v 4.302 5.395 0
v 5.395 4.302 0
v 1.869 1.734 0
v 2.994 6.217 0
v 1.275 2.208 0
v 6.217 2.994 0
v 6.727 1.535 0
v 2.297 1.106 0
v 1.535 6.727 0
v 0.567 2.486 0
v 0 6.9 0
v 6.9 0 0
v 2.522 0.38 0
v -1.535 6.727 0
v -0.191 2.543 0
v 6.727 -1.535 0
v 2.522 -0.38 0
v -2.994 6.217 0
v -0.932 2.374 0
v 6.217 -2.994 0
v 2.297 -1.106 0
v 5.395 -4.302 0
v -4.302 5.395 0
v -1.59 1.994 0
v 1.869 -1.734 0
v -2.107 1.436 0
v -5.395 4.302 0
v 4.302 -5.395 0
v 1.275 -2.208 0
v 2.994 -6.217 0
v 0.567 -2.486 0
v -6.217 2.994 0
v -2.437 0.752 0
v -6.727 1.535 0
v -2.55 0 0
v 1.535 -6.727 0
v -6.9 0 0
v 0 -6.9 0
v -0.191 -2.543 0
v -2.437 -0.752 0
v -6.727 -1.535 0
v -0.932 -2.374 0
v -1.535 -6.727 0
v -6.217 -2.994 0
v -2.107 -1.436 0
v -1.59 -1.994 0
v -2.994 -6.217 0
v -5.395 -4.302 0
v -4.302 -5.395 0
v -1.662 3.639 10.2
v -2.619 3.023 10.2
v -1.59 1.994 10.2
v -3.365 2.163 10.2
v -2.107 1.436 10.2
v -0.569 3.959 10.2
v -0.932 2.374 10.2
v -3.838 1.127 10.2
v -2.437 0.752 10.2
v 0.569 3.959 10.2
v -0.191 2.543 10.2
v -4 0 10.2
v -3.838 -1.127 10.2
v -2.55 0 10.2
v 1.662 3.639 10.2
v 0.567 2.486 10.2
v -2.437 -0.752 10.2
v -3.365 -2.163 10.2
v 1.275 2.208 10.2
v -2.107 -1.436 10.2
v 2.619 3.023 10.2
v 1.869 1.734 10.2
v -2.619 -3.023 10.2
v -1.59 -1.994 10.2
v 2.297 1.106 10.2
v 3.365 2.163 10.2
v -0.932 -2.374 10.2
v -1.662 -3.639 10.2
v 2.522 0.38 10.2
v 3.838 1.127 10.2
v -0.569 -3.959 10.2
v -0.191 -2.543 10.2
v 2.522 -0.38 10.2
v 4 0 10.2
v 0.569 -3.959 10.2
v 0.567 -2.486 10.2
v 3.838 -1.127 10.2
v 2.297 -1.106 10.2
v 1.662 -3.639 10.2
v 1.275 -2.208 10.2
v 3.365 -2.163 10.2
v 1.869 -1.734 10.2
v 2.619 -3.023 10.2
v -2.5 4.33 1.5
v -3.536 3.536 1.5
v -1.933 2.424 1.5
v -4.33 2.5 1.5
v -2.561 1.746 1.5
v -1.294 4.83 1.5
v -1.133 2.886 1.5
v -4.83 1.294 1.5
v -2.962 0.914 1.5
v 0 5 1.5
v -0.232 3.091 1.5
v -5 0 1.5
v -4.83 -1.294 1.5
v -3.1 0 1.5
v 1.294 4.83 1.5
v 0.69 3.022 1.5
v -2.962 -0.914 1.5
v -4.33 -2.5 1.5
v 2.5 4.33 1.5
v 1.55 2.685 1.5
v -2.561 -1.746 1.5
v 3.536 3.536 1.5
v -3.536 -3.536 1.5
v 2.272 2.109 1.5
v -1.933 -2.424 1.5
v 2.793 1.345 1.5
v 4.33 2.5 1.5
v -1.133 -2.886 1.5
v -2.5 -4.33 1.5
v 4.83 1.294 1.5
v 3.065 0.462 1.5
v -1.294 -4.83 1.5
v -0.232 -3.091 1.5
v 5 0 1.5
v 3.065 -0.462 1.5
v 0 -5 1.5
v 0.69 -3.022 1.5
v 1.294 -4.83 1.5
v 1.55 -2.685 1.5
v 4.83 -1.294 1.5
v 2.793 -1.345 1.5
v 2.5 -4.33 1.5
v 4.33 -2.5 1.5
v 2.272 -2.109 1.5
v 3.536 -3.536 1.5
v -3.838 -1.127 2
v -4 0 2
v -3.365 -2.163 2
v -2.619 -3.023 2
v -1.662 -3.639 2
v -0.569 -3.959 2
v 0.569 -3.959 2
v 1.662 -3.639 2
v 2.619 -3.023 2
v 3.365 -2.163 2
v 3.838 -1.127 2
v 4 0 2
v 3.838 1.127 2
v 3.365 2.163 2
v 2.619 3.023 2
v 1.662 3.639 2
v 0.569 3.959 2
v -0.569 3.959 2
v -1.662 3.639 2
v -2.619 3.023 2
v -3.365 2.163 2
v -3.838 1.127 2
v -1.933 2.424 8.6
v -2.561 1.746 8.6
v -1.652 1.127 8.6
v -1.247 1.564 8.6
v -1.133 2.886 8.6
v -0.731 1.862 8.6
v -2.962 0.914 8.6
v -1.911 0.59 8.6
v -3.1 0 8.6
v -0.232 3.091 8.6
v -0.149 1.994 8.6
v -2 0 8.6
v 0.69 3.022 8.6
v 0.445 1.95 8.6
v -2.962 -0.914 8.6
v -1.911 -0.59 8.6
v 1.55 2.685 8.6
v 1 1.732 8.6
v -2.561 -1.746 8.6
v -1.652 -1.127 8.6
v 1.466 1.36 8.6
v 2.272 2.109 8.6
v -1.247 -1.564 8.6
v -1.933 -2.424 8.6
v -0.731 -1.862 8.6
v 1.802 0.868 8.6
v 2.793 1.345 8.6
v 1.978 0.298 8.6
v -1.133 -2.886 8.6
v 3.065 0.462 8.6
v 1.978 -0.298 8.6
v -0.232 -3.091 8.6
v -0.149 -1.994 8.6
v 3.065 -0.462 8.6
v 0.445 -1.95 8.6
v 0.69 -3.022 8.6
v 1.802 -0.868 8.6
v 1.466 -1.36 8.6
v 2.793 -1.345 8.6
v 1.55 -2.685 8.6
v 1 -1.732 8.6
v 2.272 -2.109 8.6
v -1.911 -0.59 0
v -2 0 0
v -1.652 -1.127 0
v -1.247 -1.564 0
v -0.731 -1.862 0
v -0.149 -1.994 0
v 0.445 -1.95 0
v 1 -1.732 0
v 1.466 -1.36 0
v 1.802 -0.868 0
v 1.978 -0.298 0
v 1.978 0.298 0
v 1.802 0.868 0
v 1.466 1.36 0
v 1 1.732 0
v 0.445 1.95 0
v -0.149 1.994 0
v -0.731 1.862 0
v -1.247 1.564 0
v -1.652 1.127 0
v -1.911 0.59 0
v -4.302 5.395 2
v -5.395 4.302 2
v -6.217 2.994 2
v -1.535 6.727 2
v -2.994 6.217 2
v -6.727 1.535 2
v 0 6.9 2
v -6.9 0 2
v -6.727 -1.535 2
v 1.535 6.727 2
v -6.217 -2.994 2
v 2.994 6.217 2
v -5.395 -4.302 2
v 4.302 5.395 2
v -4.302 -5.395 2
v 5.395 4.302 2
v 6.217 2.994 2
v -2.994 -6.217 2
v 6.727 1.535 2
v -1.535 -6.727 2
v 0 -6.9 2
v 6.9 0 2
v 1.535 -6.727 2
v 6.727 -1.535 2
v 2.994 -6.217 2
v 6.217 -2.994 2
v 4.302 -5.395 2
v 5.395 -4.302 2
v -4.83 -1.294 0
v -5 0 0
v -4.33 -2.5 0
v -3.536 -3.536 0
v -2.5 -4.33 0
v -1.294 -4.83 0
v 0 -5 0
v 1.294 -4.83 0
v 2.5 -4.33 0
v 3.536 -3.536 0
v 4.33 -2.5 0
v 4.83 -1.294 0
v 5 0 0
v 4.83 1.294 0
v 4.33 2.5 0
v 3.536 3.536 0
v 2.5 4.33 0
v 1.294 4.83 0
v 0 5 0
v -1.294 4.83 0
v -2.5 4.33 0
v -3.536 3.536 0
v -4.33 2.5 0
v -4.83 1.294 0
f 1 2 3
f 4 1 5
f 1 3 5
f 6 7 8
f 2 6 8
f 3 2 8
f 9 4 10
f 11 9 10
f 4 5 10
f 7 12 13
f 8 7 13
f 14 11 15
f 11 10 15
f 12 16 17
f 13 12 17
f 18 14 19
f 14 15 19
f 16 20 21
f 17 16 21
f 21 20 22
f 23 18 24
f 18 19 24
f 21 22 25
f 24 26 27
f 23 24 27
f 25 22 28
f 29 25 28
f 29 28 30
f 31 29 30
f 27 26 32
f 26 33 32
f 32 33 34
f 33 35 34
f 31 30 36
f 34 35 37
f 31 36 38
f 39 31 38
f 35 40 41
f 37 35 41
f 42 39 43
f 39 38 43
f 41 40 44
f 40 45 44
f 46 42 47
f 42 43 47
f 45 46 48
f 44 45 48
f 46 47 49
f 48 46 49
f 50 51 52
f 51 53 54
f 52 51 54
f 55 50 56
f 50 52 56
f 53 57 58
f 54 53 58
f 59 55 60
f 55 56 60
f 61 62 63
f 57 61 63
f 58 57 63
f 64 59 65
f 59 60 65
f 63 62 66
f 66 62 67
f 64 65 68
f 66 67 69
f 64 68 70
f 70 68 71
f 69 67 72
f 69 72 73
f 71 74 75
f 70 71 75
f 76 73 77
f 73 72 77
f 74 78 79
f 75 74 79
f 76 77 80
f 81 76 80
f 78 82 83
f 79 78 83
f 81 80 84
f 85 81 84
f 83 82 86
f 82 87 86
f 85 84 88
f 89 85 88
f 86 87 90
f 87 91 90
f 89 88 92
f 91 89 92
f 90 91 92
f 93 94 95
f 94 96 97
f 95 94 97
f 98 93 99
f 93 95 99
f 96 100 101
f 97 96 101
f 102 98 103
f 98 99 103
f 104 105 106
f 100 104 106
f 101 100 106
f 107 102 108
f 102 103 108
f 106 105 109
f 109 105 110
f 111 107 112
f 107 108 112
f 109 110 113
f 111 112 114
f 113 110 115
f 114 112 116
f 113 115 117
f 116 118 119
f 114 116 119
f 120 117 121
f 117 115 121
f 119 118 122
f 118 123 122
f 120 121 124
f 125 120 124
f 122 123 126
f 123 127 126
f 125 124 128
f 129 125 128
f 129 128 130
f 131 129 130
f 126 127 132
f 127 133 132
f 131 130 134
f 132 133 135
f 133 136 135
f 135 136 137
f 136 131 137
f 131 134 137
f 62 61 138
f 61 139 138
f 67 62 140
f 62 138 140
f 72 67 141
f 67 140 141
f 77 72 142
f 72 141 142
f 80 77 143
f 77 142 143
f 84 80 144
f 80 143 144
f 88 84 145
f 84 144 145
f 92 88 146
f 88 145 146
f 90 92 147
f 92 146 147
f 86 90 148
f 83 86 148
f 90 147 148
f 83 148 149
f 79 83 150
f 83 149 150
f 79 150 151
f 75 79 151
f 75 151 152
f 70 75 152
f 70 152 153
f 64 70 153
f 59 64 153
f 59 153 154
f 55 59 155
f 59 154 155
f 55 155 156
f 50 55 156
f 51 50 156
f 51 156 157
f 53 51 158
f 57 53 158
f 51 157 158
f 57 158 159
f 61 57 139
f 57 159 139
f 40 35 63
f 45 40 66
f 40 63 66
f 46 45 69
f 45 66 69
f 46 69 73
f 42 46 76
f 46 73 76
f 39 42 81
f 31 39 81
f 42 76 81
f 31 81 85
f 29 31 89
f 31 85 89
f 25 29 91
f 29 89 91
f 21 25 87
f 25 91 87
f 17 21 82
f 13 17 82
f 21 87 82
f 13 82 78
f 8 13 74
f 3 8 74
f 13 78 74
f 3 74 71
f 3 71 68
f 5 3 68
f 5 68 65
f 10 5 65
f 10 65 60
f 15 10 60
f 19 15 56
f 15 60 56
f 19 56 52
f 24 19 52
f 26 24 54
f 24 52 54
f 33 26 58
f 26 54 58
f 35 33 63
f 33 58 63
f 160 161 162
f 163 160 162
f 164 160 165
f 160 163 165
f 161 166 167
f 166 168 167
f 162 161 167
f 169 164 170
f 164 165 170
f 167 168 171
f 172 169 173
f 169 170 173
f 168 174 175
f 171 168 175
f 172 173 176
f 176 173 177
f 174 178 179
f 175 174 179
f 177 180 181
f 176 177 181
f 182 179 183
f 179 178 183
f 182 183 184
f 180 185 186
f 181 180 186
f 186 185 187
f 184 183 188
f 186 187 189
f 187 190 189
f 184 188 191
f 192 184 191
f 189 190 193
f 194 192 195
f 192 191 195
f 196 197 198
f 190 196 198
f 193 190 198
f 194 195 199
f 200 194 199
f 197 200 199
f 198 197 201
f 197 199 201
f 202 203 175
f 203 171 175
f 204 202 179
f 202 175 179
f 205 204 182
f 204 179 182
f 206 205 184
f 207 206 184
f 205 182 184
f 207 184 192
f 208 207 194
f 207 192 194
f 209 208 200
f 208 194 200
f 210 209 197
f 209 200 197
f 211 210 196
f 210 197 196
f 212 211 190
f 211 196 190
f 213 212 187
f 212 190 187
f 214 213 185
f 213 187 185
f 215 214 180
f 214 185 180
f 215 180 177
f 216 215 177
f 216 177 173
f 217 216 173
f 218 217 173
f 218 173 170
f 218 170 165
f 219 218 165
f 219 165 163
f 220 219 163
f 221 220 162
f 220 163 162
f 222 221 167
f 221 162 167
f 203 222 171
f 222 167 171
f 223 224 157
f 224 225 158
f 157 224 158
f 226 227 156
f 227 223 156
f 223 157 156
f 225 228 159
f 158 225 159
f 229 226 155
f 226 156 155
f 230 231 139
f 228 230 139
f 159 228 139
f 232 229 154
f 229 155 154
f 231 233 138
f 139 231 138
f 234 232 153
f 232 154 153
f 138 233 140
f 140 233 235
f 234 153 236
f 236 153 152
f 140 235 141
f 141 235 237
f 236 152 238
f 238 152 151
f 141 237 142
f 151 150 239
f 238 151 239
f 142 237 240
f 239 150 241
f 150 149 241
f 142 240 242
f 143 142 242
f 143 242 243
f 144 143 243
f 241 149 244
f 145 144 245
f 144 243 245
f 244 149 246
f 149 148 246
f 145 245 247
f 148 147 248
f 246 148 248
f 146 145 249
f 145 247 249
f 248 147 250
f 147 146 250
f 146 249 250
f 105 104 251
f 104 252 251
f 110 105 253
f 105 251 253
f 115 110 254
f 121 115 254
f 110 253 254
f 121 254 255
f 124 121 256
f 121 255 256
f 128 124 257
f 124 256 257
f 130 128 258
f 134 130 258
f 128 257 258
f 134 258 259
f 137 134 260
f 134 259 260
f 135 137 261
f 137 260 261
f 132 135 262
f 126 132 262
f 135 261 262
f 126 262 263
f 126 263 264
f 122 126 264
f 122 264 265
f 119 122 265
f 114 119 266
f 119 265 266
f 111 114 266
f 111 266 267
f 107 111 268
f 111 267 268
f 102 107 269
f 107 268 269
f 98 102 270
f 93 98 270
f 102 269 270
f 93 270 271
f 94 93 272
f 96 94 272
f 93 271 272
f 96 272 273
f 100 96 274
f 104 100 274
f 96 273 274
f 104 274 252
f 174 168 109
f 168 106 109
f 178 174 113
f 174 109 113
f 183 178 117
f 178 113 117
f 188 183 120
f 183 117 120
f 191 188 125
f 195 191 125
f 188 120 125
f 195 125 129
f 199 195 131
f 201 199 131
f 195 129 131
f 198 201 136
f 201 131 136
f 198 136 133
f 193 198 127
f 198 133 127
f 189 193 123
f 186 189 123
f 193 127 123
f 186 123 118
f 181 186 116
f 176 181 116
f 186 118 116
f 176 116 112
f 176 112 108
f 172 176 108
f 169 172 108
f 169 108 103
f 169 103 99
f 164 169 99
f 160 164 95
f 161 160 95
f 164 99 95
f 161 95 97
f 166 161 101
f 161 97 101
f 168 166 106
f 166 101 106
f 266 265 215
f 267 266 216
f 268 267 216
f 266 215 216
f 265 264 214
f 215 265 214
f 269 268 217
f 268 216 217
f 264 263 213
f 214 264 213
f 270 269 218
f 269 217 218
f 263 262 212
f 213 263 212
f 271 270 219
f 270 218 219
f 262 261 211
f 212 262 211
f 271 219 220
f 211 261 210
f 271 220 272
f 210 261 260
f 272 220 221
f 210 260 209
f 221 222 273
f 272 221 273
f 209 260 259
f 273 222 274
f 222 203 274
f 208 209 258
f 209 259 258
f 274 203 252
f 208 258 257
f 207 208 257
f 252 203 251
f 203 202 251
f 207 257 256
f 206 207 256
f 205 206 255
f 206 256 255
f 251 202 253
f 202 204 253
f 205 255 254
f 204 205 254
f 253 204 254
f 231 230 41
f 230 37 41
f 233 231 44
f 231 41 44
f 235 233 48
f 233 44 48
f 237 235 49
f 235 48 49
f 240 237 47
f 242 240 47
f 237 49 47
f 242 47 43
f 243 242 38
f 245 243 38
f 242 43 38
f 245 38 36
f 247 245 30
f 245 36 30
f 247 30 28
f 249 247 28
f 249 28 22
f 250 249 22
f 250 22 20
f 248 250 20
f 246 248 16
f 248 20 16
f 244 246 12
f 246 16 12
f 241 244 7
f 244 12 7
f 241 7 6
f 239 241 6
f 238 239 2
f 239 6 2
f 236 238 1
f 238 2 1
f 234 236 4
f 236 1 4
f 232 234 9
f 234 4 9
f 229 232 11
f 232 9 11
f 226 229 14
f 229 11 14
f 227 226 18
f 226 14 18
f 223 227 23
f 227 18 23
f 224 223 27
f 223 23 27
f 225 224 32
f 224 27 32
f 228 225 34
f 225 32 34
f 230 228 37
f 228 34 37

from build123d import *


with BuildPart() as f1:
    # F0 (on Front) → F1 (revolve)
    with BuildSketch(Plane.XZ):
        Polygon((-5, 0), (-2, 0), (-2, 8.6), (-3.1, 8.6), (-3.1, 1.5), (-5, 1.5), align=None)
    revolve(axis=Axis((0, 0, 6.250541), (0, 0, 1)))


with BuildPart() as f3:
    # F2 (on Front) → F3 (revolve)
    with BuildSketch(Plane.XZ):
        Polygon((-6.9, 0), (-2.55, 0), (-2.55, 10.2), (-4, 10.2), (-4, 2), (-6.9, 2), align=None)
    revolve(axis=Axis((0, 0, 4.618362), (0, 0, 1)))


solid = Compound([f1.part, f3.part])
